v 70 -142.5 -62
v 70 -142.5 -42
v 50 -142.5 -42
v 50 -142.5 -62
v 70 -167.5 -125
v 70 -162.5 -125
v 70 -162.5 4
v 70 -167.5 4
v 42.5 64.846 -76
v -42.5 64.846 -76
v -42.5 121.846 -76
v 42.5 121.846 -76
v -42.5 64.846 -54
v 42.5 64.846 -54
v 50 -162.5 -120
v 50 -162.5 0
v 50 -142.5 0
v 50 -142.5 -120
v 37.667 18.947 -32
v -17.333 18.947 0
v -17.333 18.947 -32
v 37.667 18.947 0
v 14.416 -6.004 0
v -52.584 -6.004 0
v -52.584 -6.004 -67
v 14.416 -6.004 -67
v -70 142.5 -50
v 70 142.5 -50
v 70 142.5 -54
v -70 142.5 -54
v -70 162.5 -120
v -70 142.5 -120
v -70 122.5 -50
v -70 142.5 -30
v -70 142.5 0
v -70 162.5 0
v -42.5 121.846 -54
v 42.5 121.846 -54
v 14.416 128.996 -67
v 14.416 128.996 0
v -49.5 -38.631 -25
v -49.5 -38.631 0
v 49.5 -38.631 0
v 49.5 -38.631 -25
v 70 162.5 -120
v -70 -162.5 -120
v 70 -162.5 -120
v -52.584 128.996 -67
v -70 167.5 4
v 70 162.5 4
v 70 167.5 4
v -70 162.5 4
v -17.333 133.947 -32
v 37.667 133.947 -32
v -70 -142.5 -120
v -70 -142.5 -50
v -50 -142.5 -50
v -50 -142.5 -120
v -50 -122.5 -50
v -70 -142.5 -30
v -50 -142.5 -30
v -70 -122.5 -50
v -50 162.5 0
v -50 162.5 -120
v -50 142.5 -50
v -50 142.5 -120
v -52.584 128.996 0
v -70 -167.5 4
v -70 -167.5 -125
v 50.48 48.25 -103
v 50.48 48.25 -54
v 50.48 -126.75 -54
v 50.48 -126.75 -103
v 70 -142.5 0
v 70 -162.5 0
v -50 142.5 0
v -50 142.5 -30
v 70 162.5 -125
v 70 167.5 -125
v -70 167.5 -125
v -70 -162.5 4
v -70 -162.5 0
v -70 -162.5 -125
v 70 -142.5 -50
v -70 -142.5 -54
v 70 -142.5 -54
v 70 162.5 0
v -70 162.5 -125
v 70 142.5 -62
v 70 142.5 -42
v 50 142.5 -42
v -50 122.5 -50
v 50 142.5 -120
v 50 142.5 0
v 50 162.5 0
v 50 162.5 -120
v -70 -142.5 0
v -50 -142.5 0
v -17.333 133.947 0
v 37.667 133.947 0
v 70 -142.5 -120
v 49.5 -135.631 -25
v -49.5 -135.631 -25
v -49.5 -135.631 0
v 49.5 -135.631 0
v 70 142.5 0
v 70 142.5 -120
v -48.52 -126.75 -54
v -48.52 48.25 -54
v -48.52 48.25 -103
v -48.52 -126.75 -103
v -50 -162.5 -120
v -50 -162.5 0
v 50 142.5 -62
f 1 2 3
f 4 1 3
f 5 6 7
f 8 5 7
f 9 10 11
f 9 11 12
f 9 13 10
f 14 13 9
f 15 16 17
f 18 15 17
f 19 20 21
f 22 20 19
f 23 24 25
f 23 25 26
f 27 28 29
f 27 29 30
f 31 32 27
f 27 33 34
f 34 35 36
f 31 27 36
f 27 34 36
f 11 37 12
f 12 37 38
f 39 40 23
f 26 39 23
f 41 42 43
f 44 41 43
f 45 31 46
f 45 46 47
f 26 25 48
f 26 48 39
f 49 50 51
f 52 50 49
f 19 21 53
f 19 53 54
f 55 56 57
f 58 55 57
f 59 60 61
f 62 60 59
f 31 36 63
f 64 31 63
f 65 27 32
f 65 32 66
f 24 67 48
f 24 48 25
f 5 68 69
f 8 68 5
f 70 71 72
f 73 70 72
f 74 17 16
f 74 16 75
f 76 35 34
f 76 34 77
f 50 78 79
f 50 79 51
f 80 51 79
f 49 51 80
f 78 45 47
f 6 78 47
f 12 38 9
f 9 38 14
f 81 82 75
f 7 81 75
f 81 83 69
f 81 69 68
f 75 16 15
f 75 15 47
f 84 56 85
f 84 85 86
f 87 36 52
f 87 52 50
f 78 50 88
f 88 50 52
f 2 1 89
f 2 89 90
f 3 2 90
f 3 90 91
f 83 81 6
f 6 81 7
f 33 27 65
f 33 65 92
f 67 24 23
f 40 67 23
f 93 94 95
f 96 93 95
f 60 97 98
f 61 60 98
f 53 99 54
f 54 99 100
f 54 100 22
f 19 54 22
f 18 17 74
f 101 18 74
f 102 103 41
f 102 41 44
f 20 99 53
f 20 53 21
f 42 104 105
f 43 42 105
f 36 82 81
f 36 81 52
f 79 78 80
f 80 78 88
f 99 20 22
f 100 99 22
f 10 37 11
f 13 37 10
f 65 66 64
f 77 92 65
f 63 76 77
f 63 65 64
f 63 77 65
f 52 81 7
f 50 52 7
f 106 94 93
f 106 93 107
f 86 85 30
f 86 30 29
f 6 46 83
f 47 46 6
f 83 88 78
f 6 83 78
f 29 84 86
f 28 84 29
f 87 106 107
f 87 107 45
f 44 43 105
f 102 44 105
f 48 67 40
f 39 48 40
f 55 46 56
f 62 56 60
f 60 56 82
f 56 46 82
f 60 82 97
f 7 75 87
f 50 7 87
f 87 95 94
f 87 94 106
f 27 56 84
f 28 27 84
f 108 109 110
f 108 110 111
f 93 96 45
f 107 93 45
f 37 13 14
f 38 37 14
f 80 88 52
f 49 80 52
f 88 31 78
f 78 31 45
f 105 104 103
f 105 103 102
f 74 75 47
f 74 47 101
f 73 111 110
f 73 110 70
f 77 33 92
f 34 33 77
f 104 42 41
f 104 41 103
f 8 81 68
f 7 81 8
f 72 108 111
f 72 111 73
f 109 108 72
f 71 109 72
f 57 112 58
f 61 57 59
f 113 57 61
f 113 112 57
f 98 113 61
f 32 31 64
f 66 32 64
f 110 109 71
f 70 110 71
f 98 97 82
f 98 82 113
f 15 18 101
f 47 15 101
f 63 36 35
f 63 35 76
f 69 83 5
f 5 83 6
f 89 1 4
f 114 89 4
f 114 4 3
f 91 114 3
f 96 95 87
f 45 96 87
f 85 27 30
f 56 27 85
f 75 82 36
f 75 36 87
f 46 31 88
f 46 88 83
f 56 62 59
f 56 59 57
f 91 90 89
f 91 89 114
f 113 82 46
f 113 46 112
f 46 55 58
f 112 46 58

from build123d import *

# Parameters (mm, degrees)
F1_W      = 140
F1_H      = 325
F2_DEPTH  = 4
F0_W      = 20
F0_H      = 20
F3_DEPTH  = 120
F6_DEPTH  = 4
F7_W      = 55
F7_H      = 115
F8_DEPTH  = 32
F9_W      = 99
F9_H      = 175
F10_DEPTH = 49
F12_W     = 99
F12_H     = 97
F13_DEPTH = 25
F14_W     = 85
F14_H     = 57
F15_DEPTH = 22
F16_W     = 140
F16_H     = 325
F17_DEPTH = 5
F20_W     = 140
F20_H     = 129
F21_DEPTH = 5
F22_W     = 140
F22_H     = 129
F23_DEPTH = 5
F24_W     = 67
F24_H     = 135
F25_DEPTH = 67
F26_DEPTH = 20
F27_W     = 20
F27_H     = 20
F28_DEPTH = 285


with BuildPart() as f2:
    # F1 (on Top) → F2 (new body)
    with BuildSketch(Plane.XY):
        Rectangle(F1_W, F1_H)
    extrude(amount=F2_DEPTH)


with BuildPart() as f3:
    # F0 (on Top) → F3 (new body)
    with BuildSketch(Plane.XY):
        with Locations((60, -152.5)):
            Rectangle(F0_W, F0_H)
        with Locations((-60, -152.5)):
            Rectangle(F0_W, F0_H)
        with Locations((-60, 152.5)):
            Rectangle(F0_W, F0_H)
        with Locations((60, 152.5)):
            Rectangle(F0_W, F0_H)
    extrude(amount=-F3_DEPTH)

    # F18 (on face) → F26 (join)
    with BuildSketch(Plane(origin=(-70, 0, 0), x_dir=(0, -1, 0), z_dir=(-1, 0, 0))):
        Polygon((-142.5, -50), (-122.5, -50), (-142.5, -30), align=None)
        Polygon((122.5, -50), (142.5, -50), (142.5, -30), align=None)
    extrude(amount=-F26_DEPTH)


with BuildPart() as f6:
    # F5 (on offset) → F6 (new body)
    with BuildSketch(Plane.XY.offset(-50)):
        Polygon((50, -142.5), (70, -142.5), (70, 142.5), (50, 142.5), (-50, 142.5), (-70, 142.5), (-70, -142.5), (-50, -142.5), align=None)
    extrude(amount=-F6_DEPTH)


with BuildPart() as f8:
    # F7 (on face) → F8 (new body)
    with BuildSketch(Plane(origin=(0, 0, 0), x_dir=(1, 0, 0), z_dir=(0, 0, -1))):
        with Locations((10.1671721786, -76.4473453164)):
            Rectangle(F7_W, F7_H)
    extrude(amount=F8_DEPTH)


with BuildPart() as f10:
    # F9 (on face) → F10 (new body)
    with BuildSketch(Plane(origin=(0, 0, -54), x_dir=(1, 0, 0), z_dir=(0, 0, -1))):
        with Locations((0.9796765745, 39.2495542765)):
            Rectangle(F9_W, F9_H)
    extrude(amount=F10_DEPTH)


with BuildPart() as f13:
    # F12 (on face) → F13 (new body)
    with BuildSketch(Plane(origin=(0, 0, 0), x_dir=(1, 0, 0), z_dir=(0, 0, -1))):
        with Locations((0, 87.1308669448)):
            Rectangle(F12_W, F12_H)
    extrude(amount=F13_DEPTH)


with BuildPart() as f15:
    # F14 (on face) → F15 (new body)
    with BuildSketch(Plane(origin=(0, 0, -54), x_dir=(1, 0, 0), z_dir=(0, 0, -1))):
        with Locations((0, -93.3456495404)):
            Rectangle(F14_W, F14_H)
    extrude(amount=F15_DEPTH)


with BuildPart() as f17:
    # F16 (on face) → F17 (new body)
    with BuildSketch(Plane(origin=(0, 0, -120), x_dir=(1, 0, 0), z_dir=(0, 0, -1))):
        Rectangle(F16_W, F16_H)
    extrude(amount=F17_DEPTH)


with BuildPart() as f21:
    # F20 (on face) → F21 (new body)
    with BuildSketch(Plane(origin=(0, 162.5, 0), x_dir=(-1, 0, 0), z_dir=(0, 1, 0))):
        with Locations((0, -60.5)):
            Rectangle(F20_W, F20_H)
    extrude(amount=F21_DEPTH)


with BuildPart() as f23:
    # F22 (on face) → F23 (new body)
    with BuildSketch(Plane.XZ.offset(162.5)):
        with Locations((0, -60.5)):
            Rectangle(F22_W, F22_H)
    extrude(amount=F23_DEPTH)


with BuildPart() as f25:
    # F24 (on face) → F25 (new body)
    with BuildSketch(Plane(origin=(0, 0, 0), x_dir=(1, 0, 0), z_dir=(0, 0, -1))):
        with Locations((-19.0840058278, -61.4962626398)):
            Rectangle(F24_W, F24_H)
    extrude(amount=F25_DEPTH)


with BuildPart() as f28:
    # F27 (on face) → F28 (new body, through all)
    with BuildSketch(Plane(origin=(0, -142.5, 0), x_dir=(-1, 0, 0), z_dir=(0, 1, 0))):
        with Locations((-60, -52)):
            Rectangle(F27_W, F27_H)
    extrude(amount=F28_DEPTH)


solid = Compound([f2.part, f3.part, f6.part, f8.part, f10.part, f13.part, f15.part, f17.part, f21.part, f23.part, f25.part, f28.part])
